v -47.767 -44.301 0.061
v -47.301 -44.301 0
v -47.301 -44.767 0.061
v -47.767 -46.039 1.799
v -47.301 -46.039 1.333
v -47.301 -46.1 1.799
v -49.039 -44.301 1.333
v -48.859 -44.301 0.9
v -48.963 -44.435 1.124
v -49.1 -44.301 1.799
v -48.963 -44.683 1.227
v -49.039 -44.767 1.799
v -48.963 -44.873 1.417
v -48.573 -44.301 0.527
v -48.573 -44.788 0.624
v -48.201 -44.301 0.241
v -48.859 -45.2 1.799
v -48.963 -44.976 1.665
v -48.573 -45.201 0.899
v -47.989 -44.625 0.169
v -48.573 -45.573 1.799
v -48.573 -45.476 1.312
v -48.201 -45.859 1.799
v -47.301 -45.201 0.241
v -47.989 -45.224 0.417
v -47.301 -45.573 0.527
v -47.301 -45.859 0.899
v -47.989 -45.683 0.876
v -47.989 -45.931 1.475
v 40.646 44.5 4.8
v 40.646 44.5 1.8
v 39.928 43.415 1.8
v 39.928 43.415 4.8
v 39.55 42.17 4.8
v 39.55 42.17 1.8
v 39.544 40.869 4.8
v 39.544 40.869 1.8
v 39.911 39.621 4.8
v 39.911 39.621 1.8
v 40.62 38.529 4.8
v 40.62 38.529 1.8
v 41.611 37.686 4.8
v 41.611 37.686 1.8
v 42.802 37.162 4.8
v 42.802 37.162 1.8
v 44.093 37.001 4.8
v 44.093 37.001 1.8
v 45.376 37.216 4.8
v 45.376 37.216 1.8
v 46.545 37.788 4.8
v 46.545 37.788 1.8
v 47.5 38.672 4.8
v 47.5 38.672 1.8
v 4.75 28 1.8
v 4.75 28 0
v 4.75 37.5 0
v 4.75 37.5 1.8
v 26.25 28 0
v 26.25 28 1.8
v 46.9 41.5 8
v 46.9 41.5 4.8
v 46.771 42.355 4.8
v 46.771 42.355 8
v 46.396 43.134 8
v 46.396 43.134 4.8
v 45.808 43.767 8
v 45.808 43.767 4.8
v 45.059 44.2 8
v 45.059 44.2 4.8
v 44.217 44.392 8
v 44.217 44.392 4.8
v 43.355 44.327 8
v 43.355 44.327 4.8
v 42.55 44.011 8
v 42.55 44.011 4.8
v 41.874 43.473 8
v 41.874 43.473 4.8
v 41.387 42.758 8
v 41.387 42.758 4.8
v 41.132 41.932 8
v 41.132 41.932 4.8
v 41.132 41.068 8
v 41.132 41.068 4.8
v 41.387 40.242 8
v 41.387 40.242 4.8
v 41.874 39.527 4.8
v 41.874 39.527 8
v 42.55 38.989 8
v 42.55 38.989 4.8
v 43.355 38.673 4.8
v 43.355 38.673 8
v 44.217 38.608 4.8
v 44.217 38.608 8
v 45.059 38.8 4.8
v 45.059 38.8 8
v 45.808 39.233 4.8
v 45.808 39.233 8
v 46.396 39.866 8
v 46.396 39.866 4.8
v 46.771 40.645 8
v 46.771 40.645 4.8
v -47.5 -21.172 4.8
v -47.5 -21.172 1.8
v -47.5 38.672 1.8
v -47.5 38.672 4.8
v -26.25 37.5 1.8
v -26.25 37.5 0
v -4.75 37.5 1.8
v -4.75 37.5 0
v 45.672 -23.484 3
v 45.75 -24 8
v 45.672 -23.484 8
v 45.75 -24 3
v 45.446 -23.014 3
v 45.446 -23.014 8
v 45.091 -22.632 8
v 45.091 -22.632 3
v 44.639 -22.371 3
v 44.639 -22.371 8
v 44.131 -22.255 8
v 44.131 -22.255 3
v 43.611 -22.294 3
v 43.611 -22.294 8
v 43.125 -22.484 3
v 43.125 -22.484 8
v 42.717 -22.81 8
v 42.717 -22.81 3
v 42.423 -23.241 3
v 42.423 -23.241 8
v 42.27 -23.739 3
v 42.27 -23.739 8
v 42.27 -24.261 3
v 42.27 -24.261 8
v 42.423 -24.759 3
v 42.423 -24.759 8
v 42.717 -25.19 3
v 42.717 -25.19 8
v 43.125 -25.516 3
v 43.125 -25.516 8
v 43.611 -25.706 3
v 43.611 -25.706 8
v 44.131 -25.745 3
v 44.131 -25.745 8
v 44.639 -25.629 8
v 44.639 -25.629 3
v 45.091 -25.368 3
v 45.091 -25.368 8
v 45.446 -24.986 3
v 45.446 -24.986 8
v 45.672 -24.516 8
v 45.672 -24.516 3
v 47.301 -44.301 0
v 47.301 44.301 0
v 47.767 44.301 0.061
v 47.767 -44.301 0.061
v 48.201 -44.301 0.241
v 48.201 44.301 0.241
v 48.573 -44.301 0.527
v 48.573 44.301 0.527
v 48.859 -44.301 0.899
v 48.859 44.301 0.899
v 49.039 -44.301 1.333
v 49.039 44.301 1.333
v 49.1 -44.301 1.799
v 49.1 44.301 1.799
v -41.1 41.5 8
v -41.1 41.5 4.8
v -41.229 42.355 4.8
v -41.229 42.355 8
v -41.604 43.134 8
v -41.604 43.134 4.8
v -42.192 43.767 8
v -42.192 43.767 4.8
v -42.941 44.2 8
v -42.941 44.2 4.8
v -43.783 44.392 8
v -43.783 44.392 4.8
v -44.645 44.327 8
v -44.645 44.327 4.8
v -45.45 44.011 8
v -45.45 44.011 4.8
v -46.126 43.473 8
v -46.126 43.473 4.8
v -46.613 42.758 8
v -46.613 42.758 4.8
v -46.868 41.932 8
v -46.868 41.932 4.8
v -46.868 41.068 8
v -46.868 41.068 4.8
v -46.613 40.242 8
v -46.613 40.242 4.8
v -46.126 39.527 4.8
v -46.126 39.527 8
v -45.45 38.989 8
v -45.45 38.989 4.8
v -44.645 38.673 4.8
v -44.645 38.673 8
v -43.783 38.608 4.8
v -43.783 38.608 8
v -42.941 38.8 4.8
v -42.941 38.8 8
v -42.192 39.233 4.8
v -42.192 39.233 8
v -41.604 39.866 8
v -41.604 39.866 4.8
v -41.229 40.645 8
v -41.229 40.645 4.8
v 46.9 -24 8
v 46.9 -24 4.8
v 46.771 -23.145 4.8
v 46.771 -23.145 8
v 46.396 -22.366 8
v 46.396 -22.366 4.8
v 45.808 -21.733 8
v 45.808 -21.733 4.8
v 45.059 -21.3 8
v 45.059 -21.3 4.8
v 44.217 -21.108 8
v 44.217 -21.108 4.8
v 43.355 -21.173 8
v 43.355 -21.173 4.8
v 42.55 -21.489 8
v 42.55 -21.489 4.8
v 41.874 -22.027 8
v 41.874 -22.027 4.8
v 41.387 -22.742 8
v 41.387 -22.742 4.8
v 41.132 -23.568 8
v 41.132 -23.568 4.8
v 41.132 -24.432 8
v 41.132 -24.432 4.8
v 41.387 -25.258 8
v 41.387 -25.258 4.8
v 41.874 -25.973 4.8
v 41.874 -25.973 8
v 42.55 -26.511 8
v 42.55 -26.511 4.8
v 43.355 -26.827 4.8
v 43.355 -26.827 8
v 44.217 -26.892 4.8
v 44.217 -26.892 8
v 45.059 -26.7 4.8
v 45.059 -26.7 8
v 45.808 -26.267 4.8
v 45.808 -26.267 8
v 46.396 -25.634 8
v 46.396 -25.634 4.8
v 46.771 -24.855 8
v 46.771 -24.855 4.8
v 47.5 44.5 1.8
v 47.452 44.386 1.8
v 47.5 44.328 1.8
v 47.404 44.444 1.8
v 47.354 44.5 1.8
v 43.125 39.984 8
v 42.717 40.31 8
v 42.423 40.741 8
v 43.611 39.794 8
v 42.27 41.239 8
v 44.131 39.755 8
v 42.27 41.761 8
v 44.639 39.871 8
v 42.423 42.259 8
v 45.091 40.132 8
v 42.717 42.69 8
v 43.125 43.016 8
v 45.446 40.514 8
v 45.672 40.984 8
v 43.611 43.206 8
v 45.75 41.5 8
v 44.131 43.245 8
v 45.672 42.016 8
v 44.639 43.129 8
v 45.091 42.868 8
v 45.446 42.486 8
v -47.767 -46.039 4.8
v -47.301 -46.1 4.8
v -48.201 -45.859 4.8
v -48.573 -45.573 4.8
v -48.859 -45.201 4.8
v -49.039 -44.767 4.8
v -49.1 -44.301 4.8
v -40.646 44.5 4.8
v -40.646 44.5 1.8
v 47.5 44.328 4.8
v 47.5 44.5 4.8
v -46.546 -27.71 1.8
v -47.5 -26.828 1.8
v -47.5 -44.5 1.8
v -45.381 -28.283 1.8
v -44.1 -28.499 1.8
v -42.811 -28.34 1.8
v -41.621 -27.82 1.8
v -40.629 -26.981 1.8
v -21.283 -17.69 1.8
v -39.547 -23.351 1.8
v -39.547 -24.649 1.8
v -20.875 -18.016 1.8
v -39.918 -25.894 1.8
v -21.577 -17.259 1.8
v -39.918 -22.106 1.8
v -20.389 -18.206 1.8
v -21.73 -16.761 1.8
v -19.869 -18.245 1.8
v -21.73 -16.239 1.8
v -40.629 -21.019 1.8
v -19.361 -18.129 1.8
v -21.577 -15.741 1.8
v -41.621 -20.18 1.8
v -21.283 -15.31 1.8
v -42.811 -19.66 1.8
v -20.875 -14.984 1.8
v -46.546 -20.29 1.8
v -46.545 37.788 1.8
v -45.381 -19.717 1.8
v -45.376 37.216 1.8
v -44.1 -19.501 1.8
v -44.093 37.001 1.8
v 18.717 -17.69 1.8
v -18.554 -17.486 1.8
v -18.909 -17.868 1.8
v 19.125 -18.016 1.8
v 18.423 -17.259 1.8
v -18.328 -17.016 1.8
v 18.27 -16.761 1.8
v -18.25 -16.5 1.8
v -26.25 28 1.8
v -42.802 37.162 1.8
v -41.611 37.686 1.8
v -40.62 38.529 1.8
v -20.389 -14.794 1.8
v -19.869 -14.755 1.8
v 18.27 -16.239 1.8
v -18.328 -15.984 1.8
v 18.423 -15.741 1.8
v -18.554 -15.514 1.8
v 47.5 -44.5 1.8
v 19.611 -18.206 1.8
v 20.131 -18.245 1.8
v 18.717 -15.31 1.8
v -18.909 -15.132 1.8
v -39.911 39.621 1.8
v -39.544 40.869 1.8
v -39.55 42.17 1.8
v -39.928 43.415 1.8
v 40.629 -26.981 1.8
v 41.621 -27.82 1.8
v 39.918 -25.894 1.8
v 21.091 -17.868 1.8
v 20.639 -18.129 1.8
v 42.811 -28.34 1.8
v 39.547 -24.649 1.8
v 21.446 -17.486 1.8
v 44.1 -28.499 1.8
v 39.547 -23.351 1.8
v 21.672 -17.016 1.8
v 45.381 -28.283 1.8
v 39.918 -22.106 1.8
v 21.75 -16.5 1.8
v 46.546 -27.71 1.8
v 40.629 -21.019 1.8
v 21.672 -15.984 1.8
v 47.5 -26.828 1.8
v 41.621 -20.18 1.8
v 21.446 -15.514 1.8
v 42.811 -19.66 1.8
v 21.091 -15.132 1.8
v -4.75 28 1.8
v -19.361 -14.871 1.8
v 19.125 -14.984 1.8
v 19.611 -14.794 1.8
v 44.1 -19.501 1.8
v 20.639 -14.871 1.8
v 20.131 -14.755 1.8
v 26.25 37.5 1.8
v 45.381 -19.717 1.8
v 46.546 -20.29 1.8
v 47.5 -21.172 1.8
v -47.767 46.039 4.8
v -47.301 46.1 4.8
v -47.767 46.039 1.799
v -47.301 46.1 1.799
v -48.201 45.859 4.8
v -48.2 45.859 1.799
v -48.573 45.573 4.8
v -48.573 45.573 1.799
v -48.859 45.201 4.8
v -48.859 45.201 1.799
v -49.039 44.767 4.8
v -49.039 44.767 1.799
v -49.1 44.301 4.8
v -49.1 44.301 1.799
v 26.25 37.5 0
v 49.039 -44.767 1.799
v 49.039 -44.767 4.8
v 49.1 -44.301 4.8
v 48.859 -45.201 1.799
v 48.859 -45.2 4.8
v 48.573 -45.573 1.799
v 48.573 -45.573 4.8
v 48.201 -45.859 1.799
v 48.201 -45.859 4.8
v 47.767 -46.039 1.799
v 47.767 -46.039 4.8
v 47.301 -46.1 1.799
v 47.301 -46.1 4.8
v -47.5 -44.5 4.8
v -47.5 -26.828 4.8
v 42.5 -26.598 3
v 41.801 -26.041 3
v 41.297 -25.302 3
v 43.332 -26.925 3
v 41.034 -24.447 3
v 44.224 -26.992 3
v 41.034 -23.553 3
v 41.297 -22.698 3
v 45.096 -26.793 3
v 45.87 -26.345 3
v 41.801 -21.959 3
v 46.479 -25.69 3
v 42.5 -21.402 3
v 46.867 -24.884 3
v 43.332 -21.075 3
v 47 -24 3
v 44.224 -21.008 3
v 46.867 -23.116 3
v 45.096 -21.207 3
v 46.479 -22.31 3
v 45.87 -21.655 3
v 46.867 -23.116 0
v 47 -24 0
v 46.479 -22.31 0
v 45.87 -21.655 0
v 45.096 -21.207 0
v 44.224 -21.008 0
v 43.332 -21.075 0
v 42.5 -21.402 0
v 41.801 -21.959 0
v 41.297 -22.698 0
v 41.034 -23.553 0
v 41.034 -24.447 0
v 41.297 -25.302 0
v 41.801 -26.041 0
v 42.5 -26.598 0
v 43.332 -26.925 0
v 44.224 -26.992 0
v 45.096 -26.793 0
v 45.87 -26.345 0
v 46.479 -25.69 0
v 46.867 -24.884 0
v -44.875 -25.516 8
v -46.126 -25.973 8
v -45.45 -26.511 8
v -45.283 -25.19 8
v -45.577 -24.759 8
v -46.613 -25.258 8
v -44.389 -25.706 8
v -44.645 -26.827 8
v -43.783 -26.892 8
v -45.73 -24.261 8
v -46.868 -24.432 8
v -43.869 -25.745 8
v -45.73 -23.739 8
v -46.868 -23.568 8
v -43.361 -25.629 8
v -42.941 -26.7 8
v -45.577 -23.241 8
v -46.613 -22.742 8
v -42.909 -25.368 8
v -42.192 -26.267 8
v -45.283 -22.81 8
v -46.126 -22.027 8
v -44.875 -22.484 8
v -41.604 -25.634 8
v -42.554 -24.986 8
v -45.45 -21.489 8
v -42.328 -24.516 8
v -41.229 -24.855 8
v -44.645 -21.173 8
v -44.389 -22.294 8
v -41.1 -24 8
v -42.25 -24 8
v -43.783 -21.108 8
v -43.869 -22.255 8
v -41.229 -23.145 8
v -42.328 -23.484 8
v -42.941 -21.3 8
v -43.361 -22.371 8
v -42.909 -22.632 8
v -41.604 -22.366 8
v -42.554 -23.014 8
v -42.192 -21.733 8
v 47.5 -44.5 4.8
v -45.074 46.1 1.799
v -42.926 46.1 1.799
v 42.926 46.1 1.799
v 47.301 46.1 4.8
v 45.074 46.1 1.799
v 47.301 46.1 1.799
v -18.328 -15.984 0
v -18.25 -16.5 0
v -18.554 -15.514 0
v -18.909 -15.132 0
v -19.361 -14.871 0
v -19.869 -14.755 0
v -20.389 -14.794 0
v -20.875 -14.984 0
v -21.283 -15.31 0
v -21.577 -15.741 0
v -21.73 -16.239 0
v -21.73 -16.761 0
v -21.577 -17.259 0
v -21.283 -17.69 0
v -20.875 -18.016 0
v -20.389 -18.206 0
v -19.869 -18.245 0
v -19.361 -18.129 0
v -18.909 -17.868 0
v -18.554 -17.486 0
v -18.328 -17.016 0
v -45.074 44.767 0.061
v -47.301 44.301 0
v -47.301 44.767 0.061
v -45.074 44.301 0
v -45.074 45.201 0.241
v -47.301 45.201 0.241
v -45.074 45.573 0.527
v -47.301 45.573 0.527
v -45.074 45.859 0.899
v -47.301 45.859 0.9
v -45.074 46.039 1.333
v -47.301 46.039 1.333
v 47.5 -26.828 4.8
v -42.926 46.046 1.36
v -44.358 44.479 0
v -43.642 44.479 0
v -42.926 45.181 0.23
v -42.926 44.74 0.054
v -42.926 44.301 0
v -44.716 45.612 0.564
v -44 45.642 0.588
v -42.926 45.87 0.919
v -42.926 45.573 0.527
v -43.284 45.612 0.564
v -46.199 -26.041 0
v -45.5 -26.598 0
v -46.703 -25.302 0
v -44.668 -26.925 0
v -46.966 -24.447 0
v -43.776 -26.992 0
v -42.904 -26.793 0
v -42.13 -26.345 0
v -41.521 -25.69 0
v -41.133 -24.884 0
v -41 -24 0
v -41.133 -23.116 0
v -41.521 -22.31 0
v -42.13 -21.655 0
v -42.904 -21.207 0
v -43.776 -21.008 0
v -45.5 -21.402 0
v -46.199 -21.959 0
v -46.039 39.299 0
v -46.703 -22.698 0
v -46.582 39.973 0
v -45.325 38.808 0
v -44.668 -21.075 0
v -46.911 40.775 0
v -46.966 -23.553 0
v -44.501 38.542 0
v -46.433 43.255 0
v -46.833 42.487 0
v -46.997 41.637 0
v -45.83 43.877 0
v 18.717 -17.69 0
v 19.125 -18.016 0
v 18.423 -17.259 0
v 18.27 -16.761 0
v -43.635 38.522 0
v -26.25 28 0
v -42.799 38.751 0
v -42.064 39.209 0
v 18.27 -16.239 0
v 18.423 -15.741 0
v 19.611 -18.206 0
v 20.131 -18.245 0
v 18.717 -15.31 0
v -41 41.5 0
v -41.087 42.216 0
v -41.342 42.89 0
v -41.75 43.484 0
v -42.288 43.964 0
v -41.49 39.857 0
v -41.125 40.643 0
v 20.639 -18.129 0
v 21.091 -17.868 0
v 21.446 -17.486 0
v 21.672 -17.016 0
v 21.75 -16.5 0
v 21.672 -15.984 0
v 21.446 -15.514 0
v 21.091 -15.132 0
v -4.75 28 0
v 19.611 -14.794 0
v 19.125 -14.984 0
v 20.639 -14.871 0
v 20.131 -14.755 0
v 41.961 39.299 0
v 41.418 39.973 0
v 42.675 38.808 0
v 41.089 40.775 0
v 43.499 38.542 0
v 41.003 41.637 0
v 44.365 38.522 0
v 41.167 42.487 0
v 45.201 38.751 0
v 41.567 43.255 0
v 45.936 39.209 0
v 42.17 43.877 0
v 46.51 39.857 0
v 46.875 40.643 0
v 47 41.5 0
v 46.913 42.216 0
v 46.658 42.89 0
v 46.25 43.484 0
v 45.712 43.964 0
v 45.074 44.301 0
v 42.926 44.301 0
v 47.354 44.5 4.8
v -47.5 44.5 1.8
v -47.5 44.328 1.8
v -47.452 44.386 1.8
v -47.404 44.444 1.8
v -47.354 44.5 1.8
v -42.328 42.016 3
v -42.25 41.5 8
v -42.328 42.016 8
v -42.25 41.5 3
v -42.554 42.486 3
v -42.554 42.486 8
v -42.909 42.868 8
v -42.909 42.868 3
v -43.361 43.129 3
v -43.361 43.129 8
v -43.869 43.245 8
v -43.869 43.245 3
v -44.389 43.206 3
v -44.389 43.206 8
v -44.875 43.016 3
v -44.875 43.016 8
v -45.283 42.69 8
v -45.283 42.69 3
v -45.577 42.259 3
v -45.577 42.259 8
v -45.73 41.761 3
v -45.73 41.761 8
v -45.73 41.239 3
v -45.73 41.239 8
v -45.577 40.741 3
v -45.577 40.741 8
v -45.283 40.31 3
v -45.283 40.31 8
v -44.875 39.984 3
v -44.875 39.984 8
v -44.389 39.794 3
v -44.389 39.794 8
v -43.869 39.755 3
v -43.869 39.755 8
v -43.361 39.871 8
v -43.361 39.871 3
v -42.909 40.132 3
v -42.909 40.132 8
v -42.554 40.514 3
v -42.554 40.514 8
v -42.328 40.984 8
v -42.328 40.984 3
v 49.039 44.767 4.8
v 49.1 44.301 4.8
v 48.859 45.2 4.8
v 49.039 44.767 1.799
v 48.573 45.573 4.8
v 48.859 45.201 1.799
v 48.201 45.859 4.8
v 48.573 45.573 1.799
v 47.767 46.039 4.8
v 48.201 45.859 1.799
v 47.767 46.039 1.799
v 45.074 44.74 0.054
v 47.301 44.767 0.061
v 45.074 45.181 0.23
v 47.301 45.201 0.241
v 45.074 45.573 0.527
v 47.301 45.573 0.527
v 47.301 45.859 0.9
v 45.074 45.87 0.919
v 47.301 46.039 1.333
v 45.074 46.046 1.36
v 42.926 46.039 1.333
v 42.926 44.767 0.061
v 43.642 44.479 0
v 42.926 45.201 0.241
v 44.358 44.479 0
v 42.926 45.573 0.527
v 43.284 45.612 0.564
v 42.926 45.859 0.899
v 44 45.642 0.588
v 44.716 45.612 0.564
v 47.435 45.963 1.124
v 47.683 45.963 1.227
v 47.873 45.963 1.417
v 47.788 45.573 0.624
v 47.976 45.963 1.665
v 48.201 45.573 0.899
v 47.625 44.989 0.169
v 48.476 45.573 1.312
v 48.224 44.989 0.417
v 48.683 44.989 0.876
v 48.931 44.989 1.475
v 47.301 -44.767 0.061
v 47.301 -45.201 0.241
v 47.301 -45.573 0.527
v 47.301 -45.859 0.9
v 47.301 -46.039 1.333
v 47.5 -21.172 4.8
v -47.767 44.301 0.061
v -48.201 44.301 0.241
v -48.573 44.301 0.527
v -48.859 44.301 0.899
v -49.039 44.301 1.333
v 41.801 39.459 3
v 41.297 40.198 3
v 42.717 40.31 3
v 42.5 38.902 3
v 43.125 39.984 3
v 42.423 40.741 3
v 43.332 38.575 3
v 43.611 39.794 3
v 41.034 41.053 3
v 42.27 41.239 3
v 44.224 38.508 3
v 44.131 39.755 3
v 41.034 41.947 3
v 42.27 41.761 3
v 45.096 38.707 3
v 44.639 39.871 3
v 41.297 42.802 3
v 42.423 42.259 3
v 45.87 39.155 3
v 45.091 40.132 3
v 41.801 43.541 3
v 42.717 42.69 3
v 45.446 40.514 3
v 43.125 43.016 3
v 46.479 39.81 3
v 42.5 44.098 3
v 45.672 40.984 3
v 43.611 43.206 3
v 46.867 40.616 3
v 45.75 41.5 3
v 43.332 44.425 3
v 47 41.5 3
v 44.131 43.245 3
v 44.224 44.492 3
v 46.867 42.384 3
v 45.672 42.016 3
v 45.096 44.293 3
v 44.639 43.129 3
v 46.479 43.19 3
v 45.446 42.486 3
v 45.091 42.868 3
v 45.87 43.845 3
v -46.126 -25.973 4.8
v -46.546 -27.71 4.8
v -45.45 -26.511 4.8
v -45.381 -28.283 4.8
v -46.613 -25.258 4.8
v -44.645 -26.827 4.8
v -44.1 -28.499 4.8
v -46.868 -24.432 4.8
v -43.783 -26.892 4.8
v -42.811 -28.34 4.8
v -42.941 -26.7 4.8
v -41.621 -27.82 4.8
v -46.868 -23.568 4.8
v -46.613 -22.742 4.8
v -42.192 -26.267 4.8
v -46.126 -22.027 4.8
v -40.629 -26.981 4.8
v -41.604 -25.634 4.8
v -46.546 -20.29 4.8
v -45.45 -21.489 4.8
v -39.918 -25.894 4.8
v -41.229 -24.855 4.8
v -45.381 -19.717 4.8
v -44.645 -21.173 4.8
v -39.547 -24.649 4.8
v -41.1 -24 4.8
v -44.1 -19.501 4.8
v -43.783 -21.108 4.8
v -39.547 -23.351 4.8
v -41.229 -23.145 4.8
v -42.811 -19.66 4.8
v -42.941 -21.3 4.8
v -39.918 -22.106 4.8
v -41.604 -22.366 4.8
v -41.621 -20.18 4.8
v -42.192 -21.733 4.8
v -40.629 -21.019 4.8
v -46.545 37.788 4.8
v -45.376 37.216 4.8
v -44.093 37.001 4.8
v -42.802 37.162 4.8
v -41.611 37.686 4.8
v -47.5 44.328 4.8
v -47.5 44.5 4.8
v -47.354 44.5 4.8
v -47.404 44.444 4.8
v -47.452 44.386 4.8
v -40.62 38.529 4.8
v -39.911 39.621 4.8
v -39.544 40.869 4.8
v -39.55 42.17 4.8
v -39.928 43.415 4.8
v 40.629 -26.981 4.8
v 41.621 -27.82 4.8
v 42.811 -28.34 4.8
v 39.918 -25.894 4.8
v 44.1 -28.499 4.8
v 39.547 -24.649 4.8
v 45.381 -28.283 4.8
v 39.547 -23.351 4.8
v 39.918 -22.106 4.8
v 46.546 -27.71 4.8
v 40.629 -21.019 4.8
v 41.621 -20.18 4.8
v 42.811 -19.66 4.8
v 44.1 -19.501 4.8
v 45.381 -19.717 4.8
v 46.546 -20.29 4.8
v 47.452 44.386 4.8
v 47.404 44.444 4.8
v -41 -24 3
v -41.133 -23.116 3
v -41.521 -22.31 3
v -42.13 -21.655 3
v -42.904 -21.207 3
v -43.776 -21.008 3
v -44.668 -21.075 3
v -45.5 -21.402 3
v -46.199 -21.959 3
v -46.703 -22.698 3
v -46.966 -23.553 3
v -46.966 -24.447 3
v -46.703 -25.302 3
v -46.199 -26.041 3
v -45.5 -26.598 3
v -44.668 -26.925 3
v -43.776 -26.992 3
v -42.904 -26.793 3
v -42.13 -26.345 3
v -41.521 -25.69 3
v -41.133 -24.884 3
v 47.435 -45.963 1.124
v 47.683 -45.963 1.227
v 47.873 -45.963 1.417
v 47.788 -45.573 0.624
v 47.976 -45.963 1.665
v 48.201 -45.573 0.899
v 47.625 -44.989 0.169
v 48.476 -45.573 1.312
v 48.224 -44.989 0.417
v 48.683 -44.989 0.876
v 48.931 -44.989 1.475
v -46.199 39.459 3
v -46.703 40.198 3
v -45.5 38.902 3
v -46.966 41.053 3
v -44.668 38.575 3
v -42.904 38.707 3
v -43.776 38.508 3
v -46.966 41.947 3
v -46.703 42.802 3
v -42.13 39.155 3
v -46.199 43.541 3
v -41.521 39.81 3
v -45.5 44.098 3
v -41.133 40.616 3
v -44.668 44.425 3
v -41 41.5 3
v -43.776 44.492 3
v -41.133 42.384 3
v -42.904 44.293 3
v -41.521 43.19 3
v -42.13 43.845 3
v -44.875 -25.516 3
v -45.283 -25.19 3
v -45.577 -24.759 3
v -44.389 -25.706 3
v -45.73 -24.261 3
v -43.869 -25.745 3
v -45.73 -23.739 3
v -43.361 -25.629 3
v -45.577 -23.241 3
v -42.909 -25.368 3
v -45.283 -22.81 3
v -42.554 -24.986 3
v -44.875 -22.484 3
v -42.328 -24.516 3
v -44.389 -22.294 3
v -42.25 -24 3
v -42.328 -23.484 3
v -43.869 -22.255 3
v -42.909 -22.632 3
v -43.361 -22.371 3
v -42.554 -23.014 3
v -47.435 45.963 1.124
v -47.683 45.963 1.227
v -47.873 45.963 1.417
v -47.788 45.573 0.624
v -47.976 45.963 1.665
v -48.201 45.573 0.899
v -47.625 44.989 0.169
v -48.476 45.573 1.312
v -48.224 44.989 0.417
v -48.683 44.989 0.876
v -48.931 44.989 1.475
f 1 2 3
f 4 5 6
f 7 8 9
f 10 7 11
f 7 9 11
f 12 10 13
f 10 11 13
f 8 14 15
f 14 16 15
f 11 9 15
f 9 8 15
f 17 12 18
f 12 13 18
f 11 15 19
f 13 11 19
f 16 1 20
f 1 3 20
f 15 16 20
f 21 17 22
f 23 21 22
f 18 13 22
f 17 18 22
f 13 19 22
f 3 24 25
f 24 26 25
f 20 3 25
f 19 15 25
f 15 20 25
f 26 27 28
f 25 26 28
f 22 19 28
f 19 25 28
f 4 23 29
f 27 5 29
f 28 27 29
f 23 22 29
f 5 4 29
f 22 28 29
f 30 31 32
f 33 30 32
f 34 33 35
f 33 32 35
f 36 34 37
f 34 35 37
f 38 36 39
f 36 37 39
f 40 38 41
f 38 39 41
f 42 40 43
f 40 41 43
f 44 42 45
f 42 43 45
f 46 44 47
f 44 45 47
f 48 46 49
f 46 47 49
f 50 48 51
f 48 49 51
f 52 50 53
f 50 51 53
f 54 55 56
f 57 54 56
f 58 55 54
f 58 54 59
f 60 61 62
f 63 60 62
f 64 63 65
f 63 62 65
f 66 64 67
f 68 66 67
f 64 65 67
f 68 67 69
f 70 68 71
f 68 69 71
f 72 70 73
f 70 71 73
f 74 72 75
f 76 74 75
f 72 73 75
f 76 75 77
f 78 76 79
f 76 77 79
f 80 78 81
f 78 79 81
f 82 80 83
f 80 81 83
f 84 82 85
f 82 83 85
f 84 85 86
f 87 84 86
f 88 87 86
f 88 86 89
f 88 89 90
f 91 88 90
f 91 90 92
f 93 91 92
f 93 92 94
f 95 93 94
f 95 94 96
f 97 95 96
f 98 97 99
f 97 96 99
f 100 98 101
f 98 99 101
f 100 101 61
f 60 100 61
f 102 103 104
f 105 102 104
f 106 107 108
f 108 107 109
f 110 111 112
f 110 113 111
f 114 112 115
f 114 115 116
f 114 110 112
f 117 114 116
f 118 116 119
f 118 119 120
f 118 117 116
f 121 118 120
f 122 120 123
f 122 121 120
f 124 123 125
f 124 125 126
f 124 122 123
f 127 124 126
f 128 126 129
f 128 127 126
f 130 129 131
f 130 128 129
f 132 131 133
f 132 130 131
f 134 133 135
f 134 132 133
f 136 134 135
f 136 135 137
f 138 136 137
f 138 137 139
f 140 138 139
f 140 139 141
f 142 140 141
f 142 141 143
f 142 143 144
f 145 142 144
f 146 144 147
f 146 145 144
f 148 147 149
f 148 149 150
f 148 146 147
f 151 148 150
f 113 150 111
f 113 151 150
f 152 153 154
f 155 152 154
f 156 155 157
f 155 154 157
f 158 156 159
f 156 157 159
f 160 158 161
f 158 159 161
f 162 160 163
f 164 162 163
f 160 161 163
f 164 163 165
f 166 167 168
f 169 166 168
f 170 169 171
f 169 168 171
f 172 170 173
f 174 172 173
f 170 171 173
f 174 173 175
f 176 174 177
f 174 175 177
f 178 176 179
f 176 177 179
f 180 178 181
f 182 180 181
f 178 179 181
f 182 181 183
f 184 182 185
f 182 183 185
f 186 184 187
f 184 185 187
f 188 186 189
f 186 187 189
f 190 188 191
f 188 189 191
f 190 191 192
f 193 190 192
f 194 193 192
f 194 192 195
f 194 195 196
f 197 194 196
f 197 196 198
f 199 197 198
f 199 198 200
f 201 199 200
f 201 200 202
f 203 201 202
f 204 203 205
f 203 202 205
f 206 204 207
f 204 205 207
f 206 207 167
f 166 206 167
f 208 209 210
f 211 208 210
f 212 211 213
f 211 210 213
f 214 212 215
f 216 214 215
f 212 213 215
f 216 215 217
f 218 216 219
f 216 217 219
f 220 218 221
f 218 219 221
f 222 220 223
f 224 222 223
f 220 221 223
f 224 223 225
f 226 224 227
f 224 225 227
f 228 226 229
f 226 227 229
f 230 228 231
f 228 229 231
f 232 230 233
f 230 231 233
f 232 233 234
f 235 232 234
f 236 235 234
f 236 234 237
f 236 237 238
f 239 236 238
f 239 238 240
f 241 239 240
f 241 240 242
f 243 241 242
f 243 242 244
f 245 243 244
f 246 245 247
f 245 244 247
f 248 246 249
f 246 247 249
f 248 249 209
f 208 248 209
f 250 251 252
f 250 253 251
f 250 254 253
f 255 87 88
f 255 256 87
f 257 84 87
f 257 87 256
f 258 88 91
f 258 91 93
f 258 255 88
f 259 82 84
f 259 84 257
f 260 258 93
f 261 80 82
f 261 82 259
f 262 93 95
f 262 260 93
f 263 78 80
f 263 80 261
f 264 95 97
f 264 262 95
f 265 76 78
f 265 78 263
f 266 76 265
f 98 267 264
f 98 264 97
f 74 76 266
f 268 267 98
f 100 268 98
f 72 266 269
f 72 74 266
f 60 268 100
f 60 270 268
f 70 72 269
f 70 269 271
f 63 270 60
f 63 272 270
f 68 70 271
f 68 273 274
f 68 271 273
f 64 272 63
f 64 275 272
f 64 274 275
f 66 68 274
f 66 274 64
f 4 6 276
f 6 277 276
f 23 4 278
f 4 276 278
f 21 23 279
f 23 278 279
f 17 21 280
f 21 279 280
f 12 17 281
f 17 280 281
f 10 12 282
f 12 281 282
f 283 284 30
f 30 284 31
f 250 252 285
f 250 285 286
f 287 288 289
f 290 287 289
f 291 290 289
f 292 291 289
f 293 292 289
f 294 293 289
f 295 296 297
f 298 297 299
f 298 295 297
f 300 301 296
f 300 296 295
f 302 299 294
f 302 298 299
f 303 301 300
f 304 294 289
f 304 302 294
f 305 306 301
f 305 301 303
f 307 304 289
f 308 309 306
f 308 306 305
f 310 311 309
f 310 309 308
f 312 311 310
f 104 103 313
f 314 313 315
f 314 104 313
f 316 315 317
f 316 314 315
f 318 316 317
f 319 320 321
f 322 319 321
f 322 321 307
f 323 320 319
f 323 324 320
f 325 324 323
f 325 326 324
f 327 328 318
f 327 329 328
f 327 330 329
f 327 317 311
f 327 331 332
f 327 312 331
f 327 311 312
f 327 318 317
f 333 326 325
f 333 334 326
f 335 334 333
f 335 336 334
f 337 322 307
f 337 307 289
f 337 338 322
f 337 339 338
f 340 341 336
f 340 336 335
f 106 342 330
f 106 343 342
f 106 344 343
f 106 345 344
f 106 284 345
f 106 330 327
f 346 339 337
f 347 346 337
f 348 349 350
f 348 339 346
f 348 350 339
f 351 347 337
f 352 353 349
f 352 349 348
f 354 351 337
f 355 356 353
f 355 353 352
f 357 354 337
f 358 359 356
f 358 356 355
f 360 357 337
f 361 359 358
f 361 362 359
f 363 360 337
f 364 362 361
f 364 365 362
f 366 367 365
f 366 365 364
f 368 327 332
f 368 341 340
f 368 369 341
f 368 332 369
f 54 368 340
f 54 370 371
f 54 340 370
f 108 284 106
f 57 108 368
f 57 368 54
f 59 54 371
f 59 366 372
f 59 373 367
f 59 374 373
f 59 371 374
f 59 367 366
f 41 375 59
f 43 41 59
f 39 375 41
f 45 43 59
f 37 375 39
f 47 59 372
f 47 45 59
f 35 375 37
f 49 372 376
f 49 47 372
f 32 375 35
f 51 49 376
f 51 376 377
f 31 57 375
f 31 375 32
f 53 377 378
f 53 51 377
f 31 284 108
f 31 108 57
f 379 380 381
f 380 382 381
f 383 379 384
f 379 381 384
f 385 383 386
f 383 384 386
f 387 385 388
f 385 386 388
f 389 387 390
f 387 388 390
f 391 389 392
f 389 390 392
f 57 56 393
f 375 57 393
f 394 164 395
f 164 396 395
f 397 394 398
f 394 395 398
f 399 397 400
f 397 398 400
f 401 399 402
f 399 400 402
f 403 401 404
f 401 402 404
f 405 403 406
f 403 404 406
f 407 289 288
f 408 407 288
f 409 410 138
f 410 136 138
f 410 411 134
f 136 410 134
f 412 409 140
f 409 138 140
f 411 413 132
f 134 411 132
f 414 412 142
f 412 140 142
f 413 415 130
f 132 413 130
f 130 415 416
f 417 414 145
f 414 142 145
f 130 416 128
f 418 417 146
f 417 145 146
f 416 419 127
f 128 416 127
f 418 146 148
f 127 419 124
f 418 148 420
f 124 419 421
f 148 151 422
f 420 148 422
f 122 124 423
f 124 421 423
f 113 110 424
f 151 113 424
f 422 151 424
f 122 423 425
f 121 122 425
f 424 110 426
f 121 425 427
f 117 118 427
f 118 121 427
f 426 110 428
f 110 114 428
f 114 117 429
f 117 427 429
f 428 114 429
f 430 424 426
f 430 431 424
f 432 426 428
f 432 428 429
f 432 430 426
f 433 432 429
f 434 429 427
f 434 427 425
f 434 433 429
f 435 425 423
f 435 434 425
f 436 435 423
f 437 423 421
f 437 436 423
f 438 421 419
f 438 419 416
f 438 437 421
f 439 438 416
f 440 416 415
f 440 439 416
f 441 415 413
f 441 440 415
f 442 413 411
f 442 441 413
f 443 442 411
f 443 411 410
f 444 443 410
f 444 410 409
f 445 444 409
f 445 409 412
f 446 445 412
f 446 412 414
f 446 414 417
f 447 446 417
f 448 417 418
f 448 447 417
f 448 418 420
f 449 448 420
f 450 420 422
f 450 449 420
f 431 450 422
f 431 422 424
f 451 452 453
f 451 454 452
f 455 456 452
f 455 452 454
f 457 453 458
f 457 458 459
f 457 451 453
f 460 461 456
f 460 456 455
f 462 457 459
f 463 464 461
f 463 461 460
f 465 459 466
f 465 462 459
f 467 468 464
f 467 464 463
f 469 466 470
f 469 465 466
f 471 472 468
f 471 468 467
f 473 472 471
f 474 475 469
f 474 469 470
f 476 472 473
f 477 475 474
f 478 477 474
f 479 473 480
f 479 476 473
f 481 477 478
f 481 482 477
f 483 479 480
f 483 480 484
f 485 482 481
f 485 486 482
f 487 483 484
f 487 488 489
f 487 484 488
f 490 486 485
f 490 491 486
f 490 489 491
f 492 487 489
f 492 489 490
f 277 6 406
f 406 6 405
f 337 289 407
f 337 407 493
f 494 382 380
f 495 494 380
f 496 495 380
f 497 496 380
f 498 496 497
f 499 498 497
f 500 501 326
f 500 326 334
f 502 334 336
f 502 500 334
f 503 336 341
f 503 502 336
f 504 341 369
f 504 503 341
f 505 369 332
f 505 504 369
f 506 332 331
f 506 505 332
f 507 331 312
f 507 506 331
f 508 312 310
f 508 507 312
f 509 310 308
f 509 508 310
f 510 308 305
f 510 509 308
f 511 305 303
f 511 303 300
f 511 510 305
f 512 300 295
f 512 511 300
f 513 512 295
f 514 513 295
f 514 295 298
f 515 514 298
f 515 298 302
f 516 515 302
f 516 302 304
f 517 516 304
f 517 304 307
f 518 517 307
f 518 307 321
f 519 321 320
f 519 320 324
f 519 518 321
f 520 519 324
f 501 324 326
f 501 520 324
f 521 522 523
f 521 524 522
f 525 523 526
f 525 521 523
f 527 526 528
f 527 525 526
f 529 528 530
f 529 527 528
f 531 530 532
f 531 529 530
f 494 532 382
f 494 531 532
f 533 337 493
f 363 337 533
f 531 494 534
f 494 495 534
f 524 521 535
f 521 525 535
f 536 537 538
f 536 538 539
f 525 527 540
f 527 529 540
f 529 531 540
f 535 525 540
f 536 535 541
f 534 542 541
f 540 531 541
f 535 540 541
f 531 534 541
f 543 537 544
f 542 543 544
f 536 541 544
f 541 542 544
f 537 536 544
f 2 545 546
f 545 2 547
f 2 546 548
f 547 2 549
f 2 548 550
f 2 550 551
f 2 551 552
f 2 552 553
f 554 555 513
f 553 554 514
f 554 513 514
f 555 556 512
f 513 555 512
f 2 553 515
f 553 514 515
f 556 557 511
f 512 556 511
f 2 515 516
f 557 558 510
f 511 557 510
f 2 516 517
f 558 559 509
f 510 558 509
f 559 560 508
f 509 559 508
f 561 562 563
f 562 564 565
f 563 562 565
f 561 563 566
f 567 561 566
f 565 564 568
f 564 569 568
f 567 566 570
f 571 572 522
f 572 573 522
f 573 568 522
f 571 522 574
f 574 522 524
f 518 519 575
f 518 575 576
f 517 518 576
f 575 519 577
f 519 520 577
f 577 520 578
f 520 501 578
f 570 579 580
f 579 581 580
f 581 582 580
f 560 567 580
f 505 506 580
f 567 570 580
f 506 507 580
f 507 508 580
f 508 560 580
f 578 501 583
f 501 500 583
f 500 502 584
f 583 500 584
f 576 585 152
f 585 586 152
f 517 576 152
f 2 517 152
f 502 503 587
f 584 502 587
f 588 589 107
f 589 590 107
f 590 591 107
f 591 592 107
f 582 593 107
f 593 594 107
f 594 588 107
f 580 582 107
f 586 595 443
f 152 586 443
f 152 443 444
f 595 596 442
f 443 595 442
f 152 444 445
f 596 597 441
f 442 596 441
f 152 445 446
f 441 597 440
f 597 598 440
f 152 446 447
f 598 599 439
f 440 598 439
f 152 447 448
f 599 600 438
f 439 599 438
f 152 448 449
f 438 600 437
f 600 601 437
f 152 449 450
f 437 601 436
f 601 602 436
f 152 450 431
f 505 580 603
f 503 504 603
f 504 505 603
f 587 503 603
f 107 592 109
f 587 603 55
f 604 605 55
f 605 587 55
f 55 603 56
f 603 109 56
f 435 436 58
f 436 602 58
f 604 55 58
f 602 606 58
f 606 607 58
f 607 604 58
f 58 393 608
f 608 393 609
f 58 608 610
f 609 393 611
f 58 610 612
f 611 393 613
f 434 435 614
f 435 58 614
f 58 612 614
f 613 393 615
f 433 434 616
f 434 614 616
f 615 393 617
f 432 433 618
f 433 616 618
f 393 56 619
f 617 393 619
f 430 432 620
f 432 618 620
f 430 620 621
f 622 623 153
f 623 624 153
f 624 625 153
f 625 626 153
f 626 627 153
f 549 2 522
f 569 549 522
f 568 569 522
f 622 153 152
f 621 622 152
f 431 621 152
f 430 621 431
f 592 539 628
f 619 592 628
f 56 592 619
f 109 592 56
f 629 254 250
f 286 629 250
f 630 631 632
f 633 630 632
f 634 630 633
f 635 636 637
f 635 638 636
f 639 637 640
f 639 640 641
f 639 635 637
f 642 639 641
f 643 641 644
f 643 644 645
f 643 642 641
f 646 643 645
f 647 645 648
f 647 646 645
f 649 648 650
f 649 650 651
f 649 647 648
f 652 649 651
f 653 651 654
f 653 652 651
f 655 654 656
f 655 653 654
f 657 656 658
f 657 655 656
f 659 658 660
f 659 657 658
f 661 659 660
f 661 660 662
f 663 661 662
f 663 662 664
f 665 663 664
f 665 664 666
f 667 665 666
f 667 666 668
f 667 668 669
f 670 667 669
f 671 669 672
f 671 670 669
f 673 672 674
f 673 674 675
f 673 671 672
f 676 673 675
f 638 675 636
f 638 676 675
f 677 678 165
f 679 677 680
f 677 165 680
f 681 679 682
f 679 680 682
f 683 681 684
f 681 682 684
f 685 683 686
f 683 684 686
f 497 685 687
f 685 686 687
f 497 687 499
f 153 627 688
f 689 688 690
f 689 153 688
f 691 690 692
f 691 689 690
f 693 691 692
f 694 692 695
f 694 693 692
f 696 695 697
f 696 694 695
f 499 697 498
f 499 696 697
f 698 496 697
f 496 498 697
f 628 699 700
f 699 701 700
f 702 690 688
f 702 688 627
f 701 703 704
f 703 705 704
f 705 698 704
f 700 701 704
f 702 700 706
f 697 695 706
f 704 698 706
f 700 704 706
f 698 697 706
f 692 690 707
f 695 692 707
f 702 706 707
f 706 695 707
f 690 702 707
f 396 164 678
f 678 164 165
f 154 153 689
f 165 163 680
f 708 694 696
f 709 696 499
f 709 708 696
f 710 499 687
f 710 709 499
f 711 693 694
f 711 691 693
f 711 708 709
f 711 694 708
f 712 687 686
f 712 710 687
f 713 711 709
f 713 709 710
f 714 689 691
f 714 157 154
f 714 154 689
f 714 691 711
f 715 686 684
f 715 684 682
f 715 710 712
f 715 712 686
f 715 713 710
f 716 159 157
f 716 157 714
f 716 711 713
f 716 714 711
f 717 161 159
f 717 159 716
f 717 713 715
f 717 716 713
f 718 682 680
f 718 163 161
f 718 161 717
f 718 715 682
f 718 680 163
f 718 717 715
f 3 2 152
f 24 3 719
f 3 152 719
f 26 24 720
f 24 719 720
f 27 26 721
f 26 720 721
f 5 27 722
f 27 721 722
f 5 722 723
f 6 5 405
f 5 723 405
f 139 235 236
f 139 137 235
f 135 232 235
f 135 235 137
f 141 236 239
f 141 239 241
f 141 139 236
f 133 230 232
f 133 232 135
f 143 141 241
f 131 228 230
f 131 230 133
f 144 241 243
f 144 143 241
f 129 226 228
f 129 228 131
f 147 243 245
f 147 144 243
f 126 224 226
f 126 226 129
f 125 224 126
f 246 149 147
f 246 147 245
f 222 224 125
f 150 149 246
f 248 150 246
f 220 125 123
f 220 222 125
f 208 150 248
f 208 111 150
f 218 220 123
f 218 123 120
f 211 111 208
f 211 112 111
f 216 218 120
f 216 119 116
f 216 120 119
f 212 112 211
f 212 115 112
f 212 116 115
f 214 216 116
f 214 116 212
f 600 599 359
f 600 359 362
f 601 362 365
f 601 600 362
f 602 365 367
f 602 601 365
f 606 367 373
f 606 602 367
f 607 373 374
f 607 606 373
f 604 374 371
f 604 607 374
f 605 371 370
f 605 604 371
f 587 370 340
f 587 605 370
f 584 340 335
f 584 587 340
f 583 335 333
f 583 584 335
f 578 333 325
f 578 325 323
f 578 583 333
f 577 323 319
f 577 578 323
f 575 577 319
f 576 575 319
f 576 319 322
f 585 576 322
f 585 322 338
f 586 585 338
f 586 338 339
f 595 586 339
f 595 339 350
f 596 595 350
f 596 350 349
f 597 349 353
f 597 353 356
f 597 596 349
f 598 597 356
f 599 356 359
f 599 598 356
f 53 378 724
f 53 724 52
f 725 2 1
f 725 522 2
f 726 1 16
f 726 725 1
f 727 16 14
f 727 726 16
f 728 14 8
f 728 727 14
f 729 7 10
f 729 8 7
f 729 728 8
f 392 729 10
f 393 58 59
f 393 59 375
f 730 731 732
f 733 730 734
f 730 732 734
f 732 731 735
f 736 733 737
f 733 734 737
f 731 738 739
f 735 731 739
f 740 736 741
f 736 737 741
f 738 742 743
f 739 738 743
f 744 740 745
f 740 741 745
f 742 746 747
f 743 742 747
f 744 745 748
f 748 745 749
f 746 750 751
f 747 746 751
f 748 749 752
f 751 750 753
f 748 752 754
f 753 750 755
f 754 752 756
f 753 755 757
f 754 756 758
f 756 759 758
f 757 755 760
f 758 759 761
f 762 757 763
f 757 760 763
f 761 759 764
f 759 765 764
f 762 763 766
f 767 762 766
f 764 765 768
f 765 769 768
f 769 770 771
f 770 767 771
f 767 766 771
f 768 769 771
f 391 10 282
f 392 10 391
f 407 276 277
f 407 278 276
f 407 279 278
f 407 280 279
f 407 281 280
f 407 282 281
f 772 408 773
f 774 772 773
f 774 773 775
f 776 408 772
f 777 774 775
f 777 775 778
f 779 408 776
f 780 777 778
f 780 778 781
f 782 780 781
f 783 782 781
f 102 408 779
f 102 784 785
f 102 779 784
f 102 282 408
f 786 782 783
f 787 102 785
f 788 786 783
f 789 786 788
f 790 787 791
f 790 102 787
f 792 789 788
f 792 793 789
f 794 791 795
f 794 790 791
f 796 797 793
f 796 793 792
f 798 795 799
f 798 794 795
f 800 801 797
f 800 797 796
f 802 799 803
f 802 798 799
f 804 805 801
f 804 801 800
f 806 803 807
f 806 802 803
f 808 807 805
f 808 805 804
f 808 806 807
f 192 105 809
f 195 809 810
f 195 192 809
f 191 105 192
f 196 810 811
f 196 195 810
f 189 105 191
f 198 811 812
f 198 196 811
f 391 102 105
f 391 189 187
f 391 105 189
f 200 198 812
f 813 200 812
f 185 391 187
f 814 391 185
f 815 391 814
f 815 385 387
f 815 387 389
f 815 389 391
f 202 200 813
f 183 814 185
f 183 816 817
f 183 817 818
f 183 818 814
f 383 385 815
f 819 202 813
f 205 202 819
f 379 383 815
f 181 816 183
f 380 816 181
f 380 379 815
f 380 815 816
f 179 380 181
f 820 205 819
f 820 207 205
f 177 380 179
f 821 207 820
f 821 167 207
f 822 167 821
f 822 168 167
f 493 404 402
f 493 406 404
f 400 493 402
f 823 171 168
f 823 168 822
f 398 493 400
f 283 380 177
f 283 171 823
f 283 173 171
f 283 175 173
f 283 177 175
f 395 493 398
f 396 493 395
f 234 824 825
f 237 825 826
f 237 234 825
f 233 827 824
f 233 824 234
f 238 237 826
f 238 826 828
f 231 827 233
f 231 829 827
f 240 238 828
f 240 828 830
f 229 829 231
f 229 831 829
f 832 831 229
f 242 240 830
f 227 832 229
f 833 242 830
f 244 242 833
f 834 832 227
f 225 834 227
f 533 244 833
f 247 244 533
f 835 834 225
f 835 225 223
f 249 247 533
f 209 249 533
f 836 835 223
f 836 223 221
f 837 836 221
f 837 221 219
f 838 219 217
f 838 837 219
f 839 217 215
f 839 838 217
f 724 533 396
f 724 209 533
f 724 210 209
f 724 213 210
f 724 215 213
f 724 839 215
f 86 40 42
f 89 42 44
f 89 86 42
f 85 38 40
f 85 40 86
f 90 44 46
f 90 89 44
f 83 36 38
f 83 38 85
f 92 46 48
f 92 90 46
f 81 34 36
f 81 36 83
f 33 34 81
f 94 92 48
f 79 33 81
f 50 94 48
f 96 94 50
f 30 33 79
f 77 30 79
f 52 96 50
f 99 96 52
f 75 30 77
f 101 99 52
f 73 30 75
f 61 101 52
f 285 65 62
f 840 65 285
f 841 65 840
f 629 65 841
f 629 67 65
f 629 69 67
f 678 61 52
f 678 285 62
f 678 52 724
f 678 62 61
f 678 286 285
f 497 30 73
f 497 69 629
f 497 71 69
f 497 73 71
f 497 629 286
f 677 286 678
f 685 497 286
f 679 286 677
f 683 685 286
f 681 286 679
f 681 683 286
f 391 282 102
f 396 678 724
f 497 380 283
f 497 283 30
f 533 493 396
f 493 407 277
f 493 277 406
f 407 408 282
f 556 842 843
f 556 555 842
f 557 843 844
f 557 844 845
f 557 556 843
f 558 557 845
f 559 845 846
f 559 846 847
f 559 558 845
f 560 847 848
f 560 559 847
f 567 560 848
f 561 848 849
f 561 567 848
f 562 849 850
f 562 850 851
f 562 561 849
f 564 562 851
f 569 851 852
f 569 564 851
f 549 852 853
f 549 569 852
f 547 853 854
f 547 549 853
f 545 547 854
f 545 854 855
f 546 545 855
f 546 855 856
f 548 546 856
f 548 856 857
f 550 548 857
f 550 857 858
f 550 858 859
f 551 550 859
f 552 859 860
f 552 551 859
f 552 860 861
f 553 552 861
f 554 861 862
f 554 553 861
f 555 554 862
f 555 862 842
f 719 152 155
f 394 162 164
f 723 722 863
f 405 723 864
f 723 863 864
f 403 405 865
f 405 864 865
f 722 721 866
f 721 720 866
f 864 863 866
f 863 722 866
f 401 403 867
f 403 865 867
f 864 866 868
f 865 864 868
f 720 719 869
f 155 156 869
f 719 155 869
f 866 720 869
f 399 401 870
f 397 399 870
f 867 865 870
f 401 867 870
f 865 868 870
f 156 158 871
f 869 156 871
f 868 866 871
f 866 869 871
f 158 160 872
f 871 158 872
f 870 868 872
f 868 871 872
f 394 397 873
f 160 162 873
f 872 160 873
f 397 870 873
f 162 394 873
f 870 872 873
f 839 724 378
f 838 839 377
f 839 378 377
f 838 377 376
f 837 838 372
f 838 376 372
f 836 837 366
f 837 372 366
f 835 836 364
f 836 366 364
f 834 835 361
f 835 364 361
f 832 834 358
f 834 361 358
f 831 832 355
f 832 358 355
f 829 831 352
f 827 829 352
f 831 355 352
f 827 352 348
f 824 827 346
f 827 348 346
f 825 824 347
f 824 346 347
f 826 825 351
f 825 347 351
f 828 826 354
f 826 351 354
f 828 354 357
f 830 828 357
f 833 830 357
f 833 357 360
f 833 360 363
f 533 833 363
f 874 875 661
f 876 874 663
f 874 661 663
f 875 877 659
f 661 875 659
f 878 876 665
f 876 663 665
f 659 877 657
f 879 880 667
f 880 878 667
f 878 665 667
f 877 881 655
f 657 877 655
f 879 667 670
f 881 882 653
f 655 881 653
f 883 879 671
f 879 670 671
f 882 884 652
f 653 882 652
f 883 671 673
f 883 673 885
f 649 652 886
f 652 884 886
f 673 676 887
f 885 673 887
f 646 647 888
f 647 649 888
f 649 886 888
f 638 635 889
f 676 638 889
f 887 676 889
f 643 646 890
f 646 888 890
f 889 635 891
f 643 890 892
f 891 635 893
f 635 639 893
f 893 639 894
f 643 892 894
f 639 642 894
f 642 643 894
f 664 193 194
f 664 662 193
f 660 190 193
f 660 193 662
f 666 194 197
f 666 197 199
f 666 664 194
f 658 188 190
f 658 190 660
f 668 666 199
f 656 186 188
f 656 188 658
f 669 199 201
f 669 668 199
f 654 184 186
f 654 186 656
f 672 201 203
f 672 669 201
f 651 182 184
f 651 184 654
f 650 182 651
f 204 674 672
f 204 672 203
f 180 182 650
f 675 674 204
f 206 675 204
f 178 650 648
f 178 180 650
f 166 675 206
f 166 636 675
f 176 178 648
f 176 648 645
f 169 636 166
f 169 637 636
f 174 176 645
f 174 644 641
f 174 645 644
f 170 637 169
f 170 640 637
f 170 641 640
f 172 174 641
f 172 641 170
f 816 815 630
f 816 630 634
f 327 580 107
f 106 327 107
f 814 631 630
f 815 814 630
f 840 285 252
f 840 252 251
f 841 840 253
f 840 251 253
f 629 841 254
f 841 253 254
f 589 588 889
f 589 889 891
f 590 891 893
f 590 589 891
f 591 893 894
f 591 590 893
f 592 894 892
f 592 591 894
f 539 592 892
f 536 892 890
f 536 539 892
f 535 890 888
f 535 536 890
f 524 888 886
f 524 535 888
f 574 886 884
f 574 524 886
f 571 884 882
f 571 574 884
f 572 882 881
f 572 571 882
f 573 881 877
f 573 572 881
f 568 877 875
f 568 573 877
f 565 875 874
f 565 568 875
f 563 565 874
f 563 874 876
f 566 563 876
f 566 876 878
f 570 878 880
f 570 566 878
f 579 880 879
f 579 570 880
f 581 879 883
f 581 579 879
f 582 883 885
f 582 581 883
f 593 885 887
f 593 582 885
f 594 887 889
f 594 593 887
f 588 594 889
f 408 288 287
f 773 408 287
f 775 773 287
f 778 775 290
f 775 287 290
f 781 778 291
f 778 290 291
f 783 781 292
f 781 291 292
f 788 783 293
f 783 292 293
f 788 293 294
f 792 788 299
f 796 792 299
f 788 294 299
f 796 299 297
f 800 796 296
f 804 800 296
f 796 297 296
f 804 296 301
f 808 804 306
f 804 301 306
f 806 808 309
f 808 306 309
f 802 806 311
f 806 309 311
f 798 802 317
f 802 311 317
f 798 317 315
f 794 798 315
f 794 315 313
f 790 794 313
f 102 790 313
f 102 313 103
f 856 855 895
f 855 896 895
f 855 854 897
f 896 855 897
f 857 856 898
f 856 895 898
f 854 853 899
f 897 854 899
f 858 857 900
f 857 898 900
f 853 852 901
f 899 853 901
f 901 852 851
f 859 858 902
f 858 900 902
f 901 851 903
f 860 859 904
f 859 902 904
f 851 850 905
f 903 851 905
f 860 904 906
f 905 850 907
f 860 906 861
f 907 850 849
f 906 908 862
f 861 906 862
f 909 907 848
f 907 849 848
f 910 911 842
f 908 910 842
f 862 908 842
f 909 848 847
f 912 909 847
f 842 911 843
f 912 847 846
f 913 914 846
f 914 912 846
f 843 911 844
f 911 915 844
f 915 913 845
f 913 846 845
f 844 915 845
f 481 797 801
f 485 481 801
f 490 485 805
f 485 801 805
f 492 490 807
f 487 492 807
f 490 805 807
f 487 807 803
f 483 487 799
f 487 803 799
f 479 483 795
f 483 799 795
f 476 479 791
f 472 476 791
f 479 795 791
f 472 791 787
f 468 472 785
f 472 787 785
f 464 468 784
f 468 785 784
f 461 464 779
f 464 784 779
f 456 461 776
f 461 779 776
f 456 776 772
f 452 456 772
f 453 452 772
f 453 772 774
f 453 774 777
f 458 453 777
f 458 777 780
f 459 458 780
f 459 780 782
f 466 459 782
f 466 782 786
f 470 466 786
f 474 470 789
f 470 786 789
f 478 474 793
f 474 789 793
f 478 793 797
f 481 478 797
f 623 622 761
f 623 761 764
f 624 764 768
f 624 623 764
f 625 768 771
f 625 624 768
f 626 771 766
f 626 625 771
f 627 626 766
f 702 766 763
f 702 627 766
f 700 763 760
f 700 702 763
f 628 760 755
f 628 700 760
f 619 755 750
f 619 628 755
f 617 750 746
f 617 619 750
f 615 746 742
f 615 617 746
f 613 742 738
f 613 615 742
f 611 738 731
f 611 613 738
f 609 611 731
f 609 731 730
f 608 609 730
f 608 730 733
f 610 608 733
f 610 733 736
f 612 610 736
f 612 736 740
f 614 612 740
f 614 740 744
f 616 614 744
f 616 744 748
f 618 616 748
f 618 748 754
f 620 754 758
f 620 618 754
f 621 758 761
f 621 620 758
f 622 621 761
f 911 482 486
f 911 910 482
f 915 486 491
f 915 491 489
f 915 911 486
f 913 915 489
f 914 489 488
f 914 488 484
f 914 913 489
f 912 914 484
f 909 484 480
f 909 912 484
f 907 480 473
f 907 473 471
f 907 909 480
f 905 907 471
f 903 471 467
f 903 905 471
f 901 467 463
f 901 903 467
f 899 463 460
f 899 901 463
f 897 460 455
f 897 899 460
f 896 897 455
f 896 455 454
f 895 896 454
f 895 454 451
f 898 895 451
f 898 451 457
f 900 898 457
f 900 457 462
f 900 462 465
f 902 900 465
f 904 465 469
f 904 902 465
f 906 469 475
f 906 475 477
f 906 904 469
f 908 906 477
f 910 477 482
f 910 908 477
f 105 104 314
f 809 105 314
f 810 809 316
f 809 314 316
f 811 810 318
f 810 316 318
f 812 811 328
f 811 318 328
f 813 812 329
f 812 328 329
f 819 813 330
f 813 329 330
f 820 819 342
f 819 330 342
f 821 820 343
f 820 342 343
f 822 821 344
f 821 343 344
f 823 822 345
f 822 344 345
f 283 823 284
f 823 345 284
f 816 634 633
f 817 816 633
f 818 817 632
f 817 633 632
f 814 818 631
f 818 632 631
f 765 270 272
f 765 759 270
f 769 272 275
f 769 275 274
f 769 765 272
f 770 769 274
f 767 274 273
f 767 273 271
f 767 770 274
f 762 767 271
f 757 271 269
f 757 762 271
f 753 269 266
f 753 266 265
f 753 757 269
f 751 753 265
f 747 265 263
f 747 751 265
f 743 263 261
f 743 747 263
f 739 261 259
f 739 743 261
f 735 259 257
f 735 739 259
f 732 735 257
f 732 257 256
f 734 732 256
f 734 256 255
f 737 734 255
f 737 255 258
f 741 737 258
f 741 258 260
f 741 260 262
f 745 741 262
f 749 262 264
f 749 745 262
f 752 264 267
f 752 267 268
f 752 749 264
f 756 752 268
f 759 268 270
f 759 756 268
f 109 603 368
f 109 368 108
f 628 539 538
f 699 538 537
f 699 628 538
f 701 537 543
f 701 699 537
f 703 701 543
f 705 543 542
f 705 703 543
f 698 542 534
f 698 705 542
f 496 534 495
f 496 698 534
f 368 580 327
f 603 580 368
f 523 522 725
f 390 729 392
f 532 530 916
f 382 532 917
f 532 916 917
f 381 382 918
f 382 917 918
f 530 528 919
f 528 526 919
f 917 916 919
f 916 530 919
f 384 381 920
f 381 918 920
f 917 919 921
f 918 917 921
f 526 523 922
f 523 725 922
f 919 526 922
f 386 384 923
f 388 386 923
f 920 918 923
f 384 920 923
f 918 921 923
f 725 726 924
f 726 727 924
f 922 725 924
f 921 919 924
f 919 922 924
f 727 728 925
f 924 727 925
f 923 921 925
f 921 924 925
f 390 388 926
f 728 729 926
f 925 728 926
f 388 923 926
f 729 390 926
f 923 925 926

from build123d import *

# Parameters (mm, degrees)
SKETCH007_W   = 98.2
SKETCH007_H   = 92.2
SKETCH007_R   = 3
SKETCH007_R_2 = 1.75
SKETCH007_W_2 = 21.5
SKETCH007_H_2 = 9.5
PAD006_DEPTH  = 1.8
SKETCH005_W   = 98.2
SKETCH005_H   = 92.2
SKETCH005_W_2 = 95
SKETCH005_H_2 = 89
PAD007_DEPTH  = 3
SKETCH008_R   = 4.5
SKETCH008_R_2 = 3
PAD008_DEPTH  = 1.2
SKETCH009_R   = 4.5
SKETCH009_R_2 = 1.75
PAD009_DEPTH  = 1.8
SKETCH006_R   = 2.9
SKETCH006_R_2 = 1.75
PAD010_DEPTH  = 3.2
FILLET002_R   = 1.799


with BuildPart() as part:
    # Sketch007 → Pad006 (new body)
    with BuildSketch(Plane.XY):
        Rectangle(SKETCH007_W, SKETCH007_H)
        with Locations((-44, 41.5)):
            Circle(SKETCH007_R, mode=Mode.SUBTRACT)
        with Locations((44, 41.5)):
            Circle(SKETCH007_R, mode=Mode.SUBTRACT)
        with Locations((44, -24)):
            Circle(SKETCH007_R, mode=Mode.SUBTRACT)
        with Locations((-44, -24)):
            Circle(SKETCH007_R, mode=Mode.SUBTRACT)
        with Locations((-20, -16.5)):
            Circle(SKETCH007_R_2, mode=Mode.SUBTRACT)
        with Locations((20, -16.5)):
            Circle(SKETCH007_R_2, mode=Mode.SUBTRACT)
        with Locations((15.5, 32.75)):
            Rectangle(SKETCH007_W_2, SKETCH007_H_2, mode=Mode.SUBTRACT)
        with Locations((-15.5, 32.75)):
            Rectangle(SKETCH007_W_2, SKETCH007_H_2, mode=Mode.SUBTRACT)
    extrude(amount=PAD006_DEPTH)

    # Sketch005 → Pad007 (new body)
    with BuildSketch(Plane.XY.offset(1.8)):
        Rectangle(SKETCH005_W, SKETCH005_H)
        Rectangle(SKETCH005_W_2, SKETCH005_H_2, mode=Mode.SUBTRACT)
    extrude(amount=PAD007_DEPTH)

    # Sketch008 → Pad008 (new body)
    with BuildSketch(Plane.XY.offset(1.8)):
        with Locations((-44, 41.5)):
            Circle(SKETCH008_R)
        with Locations((-44, 41.5)):
            Circle(SKETCH008_R_2, mode=Mode.SUBTRACT)
        with Locations((44, 41.5)):
            Circle(SKETCH008_R)
        with Locations((44, 41.5)):
            Circle(SKETCH008_R_2, mode=Mode.SUBTRACT)
        with Locations((44, -24)):
            Circle(SKETCH008_R)
        with Locations((44, -24)):
            Circle(SKETCH008_R_2, mode=Mode.SUBTRACT)
        with Locations((-44, -24)):
            Circle(SKETCH008_R)
        with Locations((-44, -24)):
            Circle(SKETCH008_R_2, mode=Mode.SUBTRACT)
    extrude(amount=PAD008_DEPTH)

    # Sketch009 → Pad009 (new body)
    with BuildSketch(Plane.XY.offset(3)):
        with Locations((-44, 41.5)):
            Circle(SKETCH009_R)
        with Locations((-44, 41.5)):
            Circle(SKETCH009_R_2, mode=Mode.SUBTRACT)
        with Locations((44, 41.5)):
            Circle(SKETCH009_R)
        with Locations((44, 41.5)):
            Circle(SKETCH009_R_2, mode=Mode.SUBTRACT)
        with Locations((44, -24)):
            Circle(SKETCH009_R)
        with Locations((44, -24)):
            Circle(SKETCH009_R_2, mode=Mode.SUBTRACT)
        with Locations((-44, -24)):
            Circle(SKETCH009_R)
        with Locations((-44, -24)):
            Circle(SKETCH009_R_2, mode=Mode.SUBTRACT)
    extrude(amount=PAD009_DEPTH)

    # Sketch006 → Pad010 (new body)
    with BuildSketch(Plane.XY.offset(4.8)):
        with Locations((-44, 41.5)):
            Circle(SKETCH006_R)
        with Locations((-44, 41.5)):
            Circle(SKETCH006_R_2, mode=Mode.SUBTRACT)
        with Locations((44, 41.5)):
            Circle(SKETCH006_R)
        with Locations((44, 41.5)):
            Circle(SKETCH006_R_2, mode=Mode.SUBTRACT)
        with Locations((44, -24)):
            Circle(SKETCH006_R)
        with Locations((44, -24)):
            Circle(SKETCH006_R_2, mode=Mode.SUBTRACT)
        with Locations((-44, -24)):
            Circle(SKETCH006_R)
        with Locations((-44, -24)):
            Circle(SKETCH006_R_2, mode=Mode.SUBTRACT)
    extrude(amount=PAD010_DEPTH)

    # Fillet002
    fillet002_edges = [part.edges().sort_by_distance(p)[0] for p in [
        (49.1, 0, 0),
        (0, -46.1, 0),
        (-49.1, 0, 0),
        (0, 46.1, 0),
        (-49.1, 46.1, 0.9),
        (-49.1, 46.1, 3.3),
        (-49.1, -46.1, 3.3),
        (-49.1, -46.1, 0.9),
        (49.1, -46.1, 3.3),
        (49.1, -46.1, 0.9),
        (49.1, 46.1, 0.9),
        (49.1, 46.1, 3.3),
    ]]
    fillet(fillet002_edges, radius=FILLET002_R)


solid = part.part
